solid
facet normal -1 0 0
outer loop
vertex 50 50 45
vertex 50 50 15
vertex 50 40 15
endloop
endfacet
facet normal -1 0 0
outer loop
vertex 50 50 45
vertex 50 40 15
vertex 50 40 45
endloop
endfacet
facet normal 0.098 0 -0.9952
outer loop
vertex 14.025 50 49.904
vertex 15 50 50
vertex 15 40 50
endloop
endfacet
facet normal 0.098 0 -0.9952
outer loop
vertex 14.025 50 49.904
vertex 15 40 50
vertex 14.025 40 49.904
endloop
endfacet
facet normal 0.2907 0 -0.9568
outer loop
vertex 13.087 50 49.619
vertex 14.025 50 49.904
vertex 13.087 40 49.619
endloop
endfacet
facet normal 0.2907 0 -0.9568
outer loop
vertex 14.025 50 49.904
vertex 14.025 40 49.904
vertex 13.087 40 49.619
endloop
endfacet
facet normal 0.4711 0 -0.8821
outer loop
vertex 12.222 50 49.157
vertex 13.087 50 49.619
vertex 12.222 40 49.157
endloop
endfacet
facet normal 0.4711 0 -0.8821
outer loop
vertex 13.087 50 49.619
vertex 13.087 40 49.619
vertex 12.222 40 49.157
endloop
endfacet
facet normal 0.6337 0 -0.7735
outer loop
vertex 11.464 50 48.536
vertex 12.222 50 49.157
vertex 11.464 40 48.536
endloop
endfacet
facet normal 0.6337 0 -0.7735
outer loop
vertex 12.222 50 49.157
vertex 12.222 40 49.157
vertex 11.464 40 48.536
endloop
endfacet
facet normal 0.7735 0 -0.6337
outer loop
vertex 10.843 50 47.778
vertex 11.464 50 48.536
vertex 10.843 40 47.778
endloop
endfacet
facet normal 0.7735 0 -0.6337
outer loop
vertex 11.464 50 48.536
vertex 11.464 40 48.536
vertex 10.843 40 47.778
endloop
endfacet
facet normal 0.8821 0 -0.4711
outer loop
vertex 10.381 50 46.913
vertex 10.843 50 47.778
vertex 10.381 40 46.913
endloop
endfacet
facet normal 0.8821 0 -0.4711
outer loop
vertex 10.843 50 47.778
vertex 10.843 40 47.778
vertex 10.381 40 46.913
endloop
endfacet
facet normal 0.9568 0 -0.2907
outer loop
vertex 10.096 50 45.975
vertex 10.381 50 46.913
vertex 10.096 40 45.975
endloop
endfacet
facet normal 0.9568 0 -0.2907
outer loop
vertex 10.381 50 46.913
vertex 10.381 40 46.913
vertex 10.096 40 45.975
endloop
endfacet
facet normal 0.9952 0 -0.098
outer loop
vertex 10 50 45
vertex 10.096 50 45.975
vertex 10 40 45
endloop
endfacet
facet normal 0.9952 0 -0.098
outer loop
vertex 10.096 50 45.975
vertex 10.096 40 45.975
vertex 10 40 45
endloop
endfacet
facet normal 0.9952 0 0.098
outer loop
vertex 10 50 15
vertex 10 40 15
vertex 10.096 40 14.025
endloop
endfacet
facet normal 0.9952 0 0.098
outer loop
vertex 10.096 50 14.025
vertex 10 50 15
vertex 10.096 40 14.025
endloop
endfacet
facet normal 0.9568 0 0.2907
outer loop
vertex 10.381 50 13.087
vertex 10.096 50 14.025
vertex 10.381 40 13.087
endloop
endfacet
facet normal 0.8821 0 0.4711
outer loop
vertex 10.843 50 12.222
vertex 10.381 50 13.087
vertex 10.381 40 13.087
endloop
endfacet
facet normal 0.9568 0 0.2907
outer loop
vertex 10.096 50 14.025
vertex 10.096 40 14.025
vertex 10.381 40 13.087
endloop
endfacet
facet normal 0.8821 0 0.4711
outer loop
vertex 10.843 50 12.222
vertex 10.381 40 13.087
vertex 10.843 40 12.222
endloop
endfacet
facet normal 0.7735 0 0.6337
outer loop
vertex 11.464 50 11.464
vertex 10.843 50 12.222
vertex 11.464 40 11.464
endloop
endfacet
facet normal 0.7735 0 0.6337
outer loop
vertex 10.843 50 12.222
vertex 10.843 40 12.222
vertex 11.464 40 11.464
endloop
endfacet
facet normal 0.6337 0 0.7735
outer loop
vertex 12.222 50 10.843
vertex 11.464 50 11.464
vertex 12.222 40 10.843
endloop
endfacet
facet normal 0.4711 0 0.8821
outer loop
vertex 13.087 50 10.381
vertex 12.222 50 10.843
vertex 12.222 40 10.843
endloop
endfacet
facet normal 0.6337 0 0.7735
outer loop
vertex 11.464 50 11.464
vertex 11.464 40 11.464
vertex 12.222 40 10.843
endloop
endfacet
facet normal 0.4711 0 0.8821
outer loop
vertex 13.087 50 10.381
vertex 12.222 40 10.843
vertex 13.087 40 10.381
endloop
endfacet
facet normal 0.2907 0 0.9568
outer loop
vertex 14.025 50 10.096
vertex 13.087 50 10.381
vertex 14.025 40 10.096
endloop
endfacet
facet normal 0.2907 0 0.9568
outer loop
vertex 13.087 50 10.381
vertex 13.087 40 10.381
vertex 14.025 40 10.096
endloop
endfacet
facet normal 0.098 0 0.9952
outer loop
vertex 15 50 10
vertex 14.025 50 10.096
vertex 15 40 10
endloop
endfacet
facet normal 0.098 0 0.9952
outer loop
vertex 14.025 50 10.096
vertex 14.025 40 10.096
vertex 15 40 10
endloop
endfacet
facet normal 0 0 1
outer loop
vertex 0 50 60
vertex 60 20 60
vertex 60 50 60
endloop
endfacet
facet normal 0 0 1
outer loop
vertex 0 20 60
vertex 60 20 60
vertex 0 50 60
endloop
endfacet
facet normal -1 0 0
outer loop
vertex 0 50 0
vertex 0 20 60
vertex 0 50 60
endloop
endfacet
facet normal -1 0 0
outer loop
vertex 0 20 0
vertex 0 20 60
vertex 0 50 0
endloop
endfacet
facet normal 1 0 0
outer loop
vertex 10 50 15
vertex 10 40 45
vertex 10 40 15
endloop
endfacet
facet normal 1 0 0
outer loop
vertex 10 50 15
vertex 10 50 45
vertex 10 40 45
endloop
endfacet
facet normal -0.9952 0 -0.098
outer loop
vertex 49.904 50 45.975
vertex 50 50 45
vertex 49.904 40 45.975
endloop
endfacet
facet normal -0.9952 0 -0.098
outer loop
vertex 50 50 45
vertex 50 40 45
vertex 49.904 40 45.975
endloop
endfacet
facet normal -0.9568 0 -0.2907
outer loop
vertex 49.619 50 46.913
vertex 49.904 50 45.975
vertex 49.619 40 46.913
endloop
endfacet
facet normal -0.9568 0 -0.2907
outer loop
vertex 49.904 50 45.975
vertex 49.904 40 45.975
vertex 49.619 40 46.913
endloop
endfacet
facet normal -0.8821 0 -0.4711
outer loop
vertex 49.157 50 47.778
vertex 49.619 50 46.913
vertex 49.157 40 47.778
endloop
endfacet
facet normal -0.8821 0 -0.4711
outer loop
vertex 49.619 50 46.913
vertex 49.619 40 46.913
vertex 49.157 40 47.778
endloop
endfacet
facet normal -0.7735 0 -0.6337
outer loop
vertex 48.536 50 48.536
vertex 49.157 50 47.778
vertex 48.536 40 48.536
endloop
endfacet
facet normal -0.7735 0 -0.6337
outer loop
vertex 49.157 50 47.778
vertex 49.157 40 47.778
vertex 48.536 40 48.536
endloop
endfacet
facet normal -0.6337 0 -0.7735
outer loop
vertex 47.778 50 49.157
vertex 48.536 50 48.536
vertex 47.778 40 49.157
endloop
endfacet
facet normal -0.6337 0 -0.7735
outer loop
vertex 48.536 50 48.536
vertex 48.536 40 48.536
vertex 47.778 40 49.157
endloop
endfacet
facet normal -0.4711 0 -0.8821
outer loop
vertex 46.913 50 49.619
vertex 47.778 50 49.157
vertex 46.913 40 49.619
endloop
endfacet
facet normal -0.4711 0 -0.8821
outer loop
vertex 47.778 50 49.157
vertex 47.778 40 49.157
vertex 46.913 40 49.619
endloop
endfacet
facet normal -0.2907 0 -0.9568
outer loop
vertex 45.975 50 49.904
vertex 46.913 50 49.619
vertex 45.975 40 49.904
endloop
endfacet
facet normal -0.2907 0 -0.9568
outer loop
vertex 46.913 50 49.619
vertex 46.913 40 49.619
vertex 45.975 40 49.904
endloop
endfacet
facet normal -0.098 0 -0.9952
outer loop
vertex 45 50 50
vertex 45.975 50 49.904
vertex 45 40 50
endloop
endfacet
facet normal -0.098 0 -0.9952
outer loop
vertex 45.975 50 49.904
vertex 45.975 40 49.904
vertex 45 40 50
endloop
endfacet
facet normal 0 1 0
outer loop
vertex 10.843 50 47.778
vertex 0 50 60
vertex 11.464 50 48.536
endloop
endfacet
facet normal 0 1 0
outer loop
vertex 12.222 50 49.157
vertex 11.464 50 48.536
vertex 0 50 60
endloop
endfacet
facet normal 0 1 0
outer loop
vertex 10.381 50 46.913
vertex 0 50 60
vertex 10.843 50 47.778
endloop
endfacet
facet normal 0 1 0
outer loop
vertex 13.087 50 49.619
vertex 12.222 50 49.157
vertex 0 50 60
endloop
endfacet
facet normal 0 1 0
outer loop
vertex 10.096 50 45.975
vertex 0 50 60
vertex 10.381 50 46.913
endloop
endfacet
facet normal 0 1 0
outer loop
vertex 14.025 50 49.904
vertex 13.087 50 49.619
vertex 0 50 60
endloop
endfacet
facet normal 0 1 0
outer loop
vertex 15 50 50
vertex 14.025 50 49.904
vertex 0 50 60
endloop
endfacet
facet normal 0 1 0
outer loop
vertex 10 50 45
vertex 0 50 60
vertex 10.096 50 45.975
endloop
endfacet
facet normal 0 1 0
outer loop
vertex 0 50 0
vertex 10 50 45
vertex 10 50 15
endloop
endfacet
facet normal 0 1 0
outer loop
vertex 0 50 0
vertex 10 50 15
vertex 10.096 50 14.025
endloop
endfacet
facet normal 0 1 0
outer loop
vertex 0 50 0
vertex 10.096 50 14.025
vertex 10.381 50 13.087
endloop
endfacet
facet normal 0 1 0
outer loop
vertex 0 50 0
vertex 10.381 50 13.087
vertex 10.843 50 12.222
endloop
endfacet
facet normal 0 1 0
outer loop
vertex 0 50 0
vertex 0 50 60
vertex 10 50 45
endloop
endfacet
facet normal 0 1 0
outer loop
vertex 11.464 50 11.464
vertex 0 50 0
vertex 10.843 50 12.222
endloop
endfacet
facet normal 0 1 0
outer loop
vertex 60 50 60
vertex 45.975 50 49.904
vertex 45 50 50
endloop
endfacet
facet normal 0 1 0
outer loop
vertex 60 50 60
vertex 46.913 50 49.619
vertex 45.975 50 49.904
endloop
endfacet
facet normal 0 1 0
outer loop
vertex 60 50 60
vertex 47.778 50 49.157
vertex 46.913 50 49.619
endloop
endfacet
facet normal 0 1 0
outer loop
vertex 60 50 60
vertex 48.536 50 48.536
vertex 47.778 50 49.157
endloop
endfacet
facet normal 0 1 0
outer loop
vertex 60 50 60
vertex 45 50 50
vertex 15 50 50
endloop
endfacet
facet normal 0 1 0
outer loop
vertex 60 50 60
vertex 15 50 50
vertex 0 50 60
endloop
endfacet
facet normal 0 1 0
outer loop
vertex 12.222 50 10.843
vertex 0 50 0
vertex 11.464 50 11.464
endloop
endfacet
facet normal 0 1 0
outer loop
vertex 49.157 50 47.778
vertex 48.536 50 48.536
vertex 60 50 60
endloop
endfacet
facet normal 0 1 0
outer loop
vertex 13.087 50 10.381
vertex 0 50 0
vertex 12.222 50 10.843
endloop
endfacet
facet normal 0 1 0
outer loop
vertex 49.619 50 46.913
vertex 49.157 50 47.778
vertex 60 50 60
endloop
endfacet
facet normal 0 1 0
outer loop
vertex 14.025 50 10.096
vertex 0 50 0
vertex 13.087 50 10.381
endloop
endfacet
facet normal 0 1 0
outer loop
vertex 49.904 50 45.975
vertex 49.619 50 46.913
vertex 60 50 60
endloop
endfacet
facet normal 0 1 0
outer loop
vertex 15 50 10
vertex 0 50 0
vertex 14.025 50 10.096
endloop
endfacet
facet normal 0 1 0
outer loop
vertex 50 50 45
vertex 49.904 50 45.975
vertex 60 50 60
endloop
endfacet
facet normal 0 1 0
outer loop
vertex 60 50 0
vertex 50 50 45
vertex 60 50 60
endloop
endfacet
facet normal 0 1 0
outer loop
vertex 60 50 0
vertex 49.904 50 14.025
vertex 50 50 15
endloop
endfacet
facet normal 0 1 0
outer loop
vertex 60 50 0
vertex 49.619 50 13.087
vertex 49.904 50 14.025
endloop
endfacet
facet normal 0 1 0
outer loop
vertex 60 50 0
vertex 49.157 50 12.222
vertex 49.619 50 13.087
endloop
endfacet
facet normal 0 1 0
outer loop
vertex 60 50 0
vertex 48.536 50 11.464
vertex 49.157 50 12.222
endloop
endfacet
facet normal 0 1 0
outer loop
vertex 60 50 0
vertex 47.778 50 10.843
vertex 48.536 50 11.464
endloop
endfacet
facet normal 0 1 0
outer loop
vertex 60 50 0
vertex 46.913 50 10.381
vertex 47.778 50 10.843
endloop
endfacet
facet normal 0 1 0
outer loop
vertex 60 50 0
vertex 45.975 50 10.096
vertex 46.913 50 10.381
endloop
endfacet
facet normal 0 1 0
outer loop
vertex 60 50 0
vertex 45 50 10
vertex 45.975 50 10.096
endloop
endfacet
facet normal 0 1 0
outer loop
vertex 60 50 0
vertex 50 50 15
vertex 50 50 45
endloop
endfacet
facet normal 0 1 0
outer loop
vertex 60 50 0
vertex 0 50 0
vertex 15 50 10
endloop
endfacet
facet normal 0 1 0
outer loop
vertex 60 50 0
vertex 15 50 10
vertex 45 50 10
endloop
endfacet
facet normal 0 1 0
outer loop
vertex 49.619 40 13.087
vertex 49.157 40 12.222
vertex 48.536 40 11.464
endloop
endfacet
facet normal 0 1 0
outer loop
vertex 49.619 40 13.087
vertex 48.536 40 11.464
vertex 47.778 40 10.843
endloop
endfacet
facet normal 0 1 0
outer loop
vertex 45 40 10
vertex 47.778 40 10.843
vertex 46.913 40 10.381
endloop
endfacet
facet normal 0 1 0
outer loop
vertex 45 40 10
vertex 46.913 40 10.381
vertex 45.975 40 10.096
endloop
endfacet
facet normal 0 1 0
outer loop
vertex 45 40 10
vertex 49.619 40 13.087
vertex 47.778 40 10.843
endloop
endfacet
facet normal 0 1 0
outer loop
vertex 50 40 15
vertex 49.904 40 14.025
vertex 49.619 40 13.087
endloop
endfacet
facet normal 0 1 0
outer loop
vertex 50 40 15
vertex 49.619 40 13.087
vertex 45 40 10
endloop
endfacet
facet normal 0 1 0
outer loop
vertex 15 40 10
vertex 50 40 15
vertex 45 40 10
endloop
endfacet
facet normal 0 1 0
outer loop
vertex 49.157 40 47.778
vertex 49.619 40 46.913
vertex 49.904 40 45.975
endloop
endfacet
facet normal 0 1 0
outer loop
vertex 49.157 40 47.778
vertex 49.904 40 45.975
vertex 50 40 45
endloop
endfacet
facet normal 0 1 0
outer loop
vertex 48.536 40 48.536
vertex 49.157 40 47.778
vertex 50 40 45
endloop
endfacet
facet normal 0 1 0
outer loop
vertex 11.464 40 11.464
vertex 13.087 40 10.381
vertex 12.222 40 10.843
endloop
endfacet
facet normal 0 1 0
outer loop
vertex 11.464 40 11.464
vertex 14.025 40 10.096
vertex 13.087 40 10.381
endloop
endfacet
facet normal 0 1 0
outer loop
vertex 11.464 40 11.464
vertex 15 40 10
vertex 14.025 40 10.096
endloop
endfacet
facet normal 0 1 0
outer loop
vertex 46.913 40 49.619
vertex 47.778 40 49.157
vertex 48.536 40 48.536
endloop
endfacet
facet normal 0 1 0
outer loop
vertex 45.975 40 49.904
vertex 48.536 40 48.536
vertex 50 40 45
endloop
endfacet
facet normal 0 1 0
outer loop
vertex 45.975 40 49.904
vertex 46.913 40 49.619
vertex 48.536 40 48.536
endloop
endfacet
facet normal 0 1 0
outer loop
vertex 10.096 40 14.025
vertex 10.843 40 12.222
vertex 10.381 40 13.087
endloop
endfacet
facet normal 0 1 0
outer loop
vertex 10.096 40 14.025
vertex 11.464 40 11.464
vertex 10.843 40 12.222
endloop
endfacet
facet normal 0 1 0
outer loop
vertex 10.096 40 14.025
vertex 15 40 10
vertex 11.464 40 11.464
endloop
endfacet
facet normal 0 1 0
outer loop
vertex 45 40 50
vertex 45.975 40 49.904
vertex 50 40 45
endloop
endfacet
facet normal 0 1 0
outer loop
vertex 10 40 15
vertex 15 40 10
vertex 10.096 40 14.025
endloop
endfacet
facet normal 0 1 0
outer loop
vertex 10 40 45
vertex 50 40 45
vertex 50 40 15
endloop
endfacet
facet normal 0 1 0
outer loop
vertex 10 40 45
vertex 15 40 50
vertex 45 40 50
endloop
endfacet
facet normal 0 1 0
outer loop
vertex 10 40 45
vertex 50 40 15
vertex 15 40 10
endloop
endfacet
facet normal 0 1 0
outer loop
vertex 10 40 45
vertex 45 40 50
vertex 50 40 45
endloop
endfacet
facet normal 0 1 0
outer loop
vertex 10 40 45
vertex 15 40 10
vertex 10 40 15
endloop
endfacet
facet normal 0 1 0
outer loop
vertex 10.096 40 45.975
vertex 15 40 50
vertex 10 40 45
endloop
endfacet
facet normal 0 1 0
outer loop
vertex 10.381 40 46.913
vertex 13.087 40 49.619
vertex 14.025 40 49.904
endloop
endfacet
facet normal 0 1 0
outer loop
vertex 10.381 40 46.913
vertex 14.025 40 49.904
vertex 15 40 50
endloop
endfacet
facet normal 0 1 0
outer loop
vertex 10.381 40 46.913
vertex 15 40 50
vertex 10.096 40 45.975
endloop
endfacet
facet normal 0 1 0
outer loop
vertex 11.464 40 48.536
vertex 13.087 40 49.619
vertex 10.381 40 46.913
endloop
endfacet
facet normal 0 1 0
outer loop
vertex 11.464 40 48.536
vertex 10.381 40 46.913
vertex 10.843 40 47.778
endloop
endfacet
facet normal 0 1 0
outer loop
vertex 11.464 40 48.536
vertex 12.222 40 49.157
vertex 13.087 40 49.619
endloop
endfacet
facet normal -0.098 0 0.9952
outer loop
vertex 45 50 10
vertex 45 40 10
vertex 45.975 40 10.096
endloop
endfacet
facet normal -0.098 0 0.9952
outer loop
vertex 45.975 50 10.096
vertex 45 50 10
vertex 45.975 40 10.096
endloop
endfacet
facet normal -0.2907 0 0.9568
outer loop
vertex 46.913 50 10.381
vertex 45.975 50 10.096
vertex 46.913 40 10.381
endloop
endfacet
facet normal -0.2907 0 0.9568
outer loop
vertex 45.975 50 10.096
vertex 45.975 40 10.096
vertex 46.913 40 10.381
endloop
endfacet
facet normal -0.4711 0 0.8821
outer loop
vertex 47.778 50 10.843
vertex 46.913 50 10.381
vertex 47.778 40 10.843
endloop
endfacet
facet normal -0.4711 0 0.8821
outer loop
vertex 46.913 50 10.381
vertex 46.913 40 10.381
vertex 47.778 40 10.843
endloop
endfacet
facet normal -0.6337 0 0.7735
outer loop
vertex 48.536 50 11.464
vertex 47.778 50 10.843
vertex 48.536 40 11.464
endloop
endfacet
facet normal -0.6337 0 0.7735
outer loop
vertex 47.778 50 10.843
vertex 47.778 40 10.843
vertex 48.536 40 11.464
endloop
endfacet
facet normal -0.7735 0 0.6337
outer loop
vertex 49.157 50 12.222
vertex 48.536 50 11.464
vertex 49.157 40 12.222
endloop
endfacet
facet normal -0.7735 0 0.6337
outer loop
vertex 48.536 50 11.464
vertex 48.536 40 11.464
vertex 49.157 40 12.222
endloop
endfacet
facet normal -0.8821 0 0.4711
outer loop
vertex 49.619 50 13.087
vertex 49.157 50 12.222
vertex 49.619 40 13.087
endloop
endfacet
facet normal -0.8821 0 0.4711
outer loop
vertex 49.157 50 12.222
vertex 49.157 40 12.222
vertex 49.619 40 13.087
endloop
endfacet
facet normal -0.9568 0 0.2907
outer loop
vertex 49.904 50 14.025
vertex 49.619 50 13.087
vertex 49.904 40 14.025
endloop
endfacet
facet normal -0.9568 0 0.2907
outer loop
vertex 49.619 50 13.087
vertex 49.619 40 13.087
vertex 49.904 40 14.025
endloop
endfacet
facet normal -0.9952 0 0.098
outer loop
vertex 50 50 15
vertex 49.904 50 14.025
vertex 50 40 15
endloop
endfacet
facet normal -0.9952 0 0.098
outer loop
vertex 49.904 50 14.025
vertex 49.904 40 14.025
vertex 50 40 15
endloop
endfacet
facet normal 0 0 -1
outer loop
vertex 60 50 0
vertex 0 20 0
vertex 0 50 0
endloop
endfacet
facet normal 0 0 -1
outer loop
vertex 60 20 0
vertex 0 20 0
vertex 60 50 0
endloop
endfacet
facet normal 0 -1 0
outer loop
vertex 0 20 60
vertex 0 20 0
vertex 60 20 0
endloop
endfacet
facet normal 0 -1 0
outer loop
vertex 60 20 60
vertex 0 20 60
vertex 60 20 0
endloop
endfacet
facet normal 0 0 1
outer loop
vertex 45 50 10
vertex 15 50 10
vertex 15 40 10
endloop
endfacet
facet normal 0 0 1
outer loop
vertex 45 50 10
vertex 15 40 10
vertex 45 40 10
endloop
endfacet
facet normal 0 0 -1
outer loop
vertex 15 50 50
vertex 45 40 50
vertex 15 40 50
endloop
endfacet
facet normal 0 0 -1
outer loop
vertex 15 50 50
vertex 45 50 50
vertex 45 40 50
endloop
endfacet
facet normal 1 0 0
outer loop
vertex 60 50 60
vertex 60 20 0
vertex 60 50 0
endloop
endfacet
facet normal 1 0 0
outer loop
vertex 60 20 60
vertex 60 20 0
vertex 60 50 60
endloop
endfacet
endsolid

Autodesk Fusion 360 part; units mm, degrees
sketch "Sketch1" plane through (0, 0, 0) normal (0, 1, 0) x (1, 0, 0)
  line L0 (0, 0) -> (60, 0)
  line L1 (60, 0) -> (60, -60)
  line L2 (60, -60) -> (0, -60)
  line L3 (0, -60) -> (0, 0)
  dimension "d1" = 60
  dimension "d2" = 60
extrude "Extrude1" add sketch "Sketch1" along normal blind 50
sketch "Sketch2" plane through (0, 50, 0) normal (0, 1, 0) x (-1, 0, 0)
  line L0 (0, 60) -> (-60, 60)
  line L1 (-60, 60) -> (-60, 0)
  line L2 (-60, 0) -> (0, 0)
  line L3 (0, 0) -> (0, 60)
  line L4 (-10, 10) -> (-50, 10)
  line L5 (-50, 10) -> (-50, 50)
  line L6 (-50, 50) -> (-10, 50)
  line L7 (-10, 50) -> (-10, 10)
  dimension "d5" = 10
  dimension "d6" = 10
  dimension "d7" = 10
  dimension "d8" = 10
extrude "Extrude2" cut 1 faces at (20, 0, 20) along direction (0, 1, 0) blind 20
extrude "Extrude3" cut sketch "Sketch2" against normal blind 10 contours L4 L5 L6 L7
fillet "Fillet1" radius 5 4 edges at (10, 45, 10) (10, 45, 50) (50, 45, 50) (50, 45, 10)
